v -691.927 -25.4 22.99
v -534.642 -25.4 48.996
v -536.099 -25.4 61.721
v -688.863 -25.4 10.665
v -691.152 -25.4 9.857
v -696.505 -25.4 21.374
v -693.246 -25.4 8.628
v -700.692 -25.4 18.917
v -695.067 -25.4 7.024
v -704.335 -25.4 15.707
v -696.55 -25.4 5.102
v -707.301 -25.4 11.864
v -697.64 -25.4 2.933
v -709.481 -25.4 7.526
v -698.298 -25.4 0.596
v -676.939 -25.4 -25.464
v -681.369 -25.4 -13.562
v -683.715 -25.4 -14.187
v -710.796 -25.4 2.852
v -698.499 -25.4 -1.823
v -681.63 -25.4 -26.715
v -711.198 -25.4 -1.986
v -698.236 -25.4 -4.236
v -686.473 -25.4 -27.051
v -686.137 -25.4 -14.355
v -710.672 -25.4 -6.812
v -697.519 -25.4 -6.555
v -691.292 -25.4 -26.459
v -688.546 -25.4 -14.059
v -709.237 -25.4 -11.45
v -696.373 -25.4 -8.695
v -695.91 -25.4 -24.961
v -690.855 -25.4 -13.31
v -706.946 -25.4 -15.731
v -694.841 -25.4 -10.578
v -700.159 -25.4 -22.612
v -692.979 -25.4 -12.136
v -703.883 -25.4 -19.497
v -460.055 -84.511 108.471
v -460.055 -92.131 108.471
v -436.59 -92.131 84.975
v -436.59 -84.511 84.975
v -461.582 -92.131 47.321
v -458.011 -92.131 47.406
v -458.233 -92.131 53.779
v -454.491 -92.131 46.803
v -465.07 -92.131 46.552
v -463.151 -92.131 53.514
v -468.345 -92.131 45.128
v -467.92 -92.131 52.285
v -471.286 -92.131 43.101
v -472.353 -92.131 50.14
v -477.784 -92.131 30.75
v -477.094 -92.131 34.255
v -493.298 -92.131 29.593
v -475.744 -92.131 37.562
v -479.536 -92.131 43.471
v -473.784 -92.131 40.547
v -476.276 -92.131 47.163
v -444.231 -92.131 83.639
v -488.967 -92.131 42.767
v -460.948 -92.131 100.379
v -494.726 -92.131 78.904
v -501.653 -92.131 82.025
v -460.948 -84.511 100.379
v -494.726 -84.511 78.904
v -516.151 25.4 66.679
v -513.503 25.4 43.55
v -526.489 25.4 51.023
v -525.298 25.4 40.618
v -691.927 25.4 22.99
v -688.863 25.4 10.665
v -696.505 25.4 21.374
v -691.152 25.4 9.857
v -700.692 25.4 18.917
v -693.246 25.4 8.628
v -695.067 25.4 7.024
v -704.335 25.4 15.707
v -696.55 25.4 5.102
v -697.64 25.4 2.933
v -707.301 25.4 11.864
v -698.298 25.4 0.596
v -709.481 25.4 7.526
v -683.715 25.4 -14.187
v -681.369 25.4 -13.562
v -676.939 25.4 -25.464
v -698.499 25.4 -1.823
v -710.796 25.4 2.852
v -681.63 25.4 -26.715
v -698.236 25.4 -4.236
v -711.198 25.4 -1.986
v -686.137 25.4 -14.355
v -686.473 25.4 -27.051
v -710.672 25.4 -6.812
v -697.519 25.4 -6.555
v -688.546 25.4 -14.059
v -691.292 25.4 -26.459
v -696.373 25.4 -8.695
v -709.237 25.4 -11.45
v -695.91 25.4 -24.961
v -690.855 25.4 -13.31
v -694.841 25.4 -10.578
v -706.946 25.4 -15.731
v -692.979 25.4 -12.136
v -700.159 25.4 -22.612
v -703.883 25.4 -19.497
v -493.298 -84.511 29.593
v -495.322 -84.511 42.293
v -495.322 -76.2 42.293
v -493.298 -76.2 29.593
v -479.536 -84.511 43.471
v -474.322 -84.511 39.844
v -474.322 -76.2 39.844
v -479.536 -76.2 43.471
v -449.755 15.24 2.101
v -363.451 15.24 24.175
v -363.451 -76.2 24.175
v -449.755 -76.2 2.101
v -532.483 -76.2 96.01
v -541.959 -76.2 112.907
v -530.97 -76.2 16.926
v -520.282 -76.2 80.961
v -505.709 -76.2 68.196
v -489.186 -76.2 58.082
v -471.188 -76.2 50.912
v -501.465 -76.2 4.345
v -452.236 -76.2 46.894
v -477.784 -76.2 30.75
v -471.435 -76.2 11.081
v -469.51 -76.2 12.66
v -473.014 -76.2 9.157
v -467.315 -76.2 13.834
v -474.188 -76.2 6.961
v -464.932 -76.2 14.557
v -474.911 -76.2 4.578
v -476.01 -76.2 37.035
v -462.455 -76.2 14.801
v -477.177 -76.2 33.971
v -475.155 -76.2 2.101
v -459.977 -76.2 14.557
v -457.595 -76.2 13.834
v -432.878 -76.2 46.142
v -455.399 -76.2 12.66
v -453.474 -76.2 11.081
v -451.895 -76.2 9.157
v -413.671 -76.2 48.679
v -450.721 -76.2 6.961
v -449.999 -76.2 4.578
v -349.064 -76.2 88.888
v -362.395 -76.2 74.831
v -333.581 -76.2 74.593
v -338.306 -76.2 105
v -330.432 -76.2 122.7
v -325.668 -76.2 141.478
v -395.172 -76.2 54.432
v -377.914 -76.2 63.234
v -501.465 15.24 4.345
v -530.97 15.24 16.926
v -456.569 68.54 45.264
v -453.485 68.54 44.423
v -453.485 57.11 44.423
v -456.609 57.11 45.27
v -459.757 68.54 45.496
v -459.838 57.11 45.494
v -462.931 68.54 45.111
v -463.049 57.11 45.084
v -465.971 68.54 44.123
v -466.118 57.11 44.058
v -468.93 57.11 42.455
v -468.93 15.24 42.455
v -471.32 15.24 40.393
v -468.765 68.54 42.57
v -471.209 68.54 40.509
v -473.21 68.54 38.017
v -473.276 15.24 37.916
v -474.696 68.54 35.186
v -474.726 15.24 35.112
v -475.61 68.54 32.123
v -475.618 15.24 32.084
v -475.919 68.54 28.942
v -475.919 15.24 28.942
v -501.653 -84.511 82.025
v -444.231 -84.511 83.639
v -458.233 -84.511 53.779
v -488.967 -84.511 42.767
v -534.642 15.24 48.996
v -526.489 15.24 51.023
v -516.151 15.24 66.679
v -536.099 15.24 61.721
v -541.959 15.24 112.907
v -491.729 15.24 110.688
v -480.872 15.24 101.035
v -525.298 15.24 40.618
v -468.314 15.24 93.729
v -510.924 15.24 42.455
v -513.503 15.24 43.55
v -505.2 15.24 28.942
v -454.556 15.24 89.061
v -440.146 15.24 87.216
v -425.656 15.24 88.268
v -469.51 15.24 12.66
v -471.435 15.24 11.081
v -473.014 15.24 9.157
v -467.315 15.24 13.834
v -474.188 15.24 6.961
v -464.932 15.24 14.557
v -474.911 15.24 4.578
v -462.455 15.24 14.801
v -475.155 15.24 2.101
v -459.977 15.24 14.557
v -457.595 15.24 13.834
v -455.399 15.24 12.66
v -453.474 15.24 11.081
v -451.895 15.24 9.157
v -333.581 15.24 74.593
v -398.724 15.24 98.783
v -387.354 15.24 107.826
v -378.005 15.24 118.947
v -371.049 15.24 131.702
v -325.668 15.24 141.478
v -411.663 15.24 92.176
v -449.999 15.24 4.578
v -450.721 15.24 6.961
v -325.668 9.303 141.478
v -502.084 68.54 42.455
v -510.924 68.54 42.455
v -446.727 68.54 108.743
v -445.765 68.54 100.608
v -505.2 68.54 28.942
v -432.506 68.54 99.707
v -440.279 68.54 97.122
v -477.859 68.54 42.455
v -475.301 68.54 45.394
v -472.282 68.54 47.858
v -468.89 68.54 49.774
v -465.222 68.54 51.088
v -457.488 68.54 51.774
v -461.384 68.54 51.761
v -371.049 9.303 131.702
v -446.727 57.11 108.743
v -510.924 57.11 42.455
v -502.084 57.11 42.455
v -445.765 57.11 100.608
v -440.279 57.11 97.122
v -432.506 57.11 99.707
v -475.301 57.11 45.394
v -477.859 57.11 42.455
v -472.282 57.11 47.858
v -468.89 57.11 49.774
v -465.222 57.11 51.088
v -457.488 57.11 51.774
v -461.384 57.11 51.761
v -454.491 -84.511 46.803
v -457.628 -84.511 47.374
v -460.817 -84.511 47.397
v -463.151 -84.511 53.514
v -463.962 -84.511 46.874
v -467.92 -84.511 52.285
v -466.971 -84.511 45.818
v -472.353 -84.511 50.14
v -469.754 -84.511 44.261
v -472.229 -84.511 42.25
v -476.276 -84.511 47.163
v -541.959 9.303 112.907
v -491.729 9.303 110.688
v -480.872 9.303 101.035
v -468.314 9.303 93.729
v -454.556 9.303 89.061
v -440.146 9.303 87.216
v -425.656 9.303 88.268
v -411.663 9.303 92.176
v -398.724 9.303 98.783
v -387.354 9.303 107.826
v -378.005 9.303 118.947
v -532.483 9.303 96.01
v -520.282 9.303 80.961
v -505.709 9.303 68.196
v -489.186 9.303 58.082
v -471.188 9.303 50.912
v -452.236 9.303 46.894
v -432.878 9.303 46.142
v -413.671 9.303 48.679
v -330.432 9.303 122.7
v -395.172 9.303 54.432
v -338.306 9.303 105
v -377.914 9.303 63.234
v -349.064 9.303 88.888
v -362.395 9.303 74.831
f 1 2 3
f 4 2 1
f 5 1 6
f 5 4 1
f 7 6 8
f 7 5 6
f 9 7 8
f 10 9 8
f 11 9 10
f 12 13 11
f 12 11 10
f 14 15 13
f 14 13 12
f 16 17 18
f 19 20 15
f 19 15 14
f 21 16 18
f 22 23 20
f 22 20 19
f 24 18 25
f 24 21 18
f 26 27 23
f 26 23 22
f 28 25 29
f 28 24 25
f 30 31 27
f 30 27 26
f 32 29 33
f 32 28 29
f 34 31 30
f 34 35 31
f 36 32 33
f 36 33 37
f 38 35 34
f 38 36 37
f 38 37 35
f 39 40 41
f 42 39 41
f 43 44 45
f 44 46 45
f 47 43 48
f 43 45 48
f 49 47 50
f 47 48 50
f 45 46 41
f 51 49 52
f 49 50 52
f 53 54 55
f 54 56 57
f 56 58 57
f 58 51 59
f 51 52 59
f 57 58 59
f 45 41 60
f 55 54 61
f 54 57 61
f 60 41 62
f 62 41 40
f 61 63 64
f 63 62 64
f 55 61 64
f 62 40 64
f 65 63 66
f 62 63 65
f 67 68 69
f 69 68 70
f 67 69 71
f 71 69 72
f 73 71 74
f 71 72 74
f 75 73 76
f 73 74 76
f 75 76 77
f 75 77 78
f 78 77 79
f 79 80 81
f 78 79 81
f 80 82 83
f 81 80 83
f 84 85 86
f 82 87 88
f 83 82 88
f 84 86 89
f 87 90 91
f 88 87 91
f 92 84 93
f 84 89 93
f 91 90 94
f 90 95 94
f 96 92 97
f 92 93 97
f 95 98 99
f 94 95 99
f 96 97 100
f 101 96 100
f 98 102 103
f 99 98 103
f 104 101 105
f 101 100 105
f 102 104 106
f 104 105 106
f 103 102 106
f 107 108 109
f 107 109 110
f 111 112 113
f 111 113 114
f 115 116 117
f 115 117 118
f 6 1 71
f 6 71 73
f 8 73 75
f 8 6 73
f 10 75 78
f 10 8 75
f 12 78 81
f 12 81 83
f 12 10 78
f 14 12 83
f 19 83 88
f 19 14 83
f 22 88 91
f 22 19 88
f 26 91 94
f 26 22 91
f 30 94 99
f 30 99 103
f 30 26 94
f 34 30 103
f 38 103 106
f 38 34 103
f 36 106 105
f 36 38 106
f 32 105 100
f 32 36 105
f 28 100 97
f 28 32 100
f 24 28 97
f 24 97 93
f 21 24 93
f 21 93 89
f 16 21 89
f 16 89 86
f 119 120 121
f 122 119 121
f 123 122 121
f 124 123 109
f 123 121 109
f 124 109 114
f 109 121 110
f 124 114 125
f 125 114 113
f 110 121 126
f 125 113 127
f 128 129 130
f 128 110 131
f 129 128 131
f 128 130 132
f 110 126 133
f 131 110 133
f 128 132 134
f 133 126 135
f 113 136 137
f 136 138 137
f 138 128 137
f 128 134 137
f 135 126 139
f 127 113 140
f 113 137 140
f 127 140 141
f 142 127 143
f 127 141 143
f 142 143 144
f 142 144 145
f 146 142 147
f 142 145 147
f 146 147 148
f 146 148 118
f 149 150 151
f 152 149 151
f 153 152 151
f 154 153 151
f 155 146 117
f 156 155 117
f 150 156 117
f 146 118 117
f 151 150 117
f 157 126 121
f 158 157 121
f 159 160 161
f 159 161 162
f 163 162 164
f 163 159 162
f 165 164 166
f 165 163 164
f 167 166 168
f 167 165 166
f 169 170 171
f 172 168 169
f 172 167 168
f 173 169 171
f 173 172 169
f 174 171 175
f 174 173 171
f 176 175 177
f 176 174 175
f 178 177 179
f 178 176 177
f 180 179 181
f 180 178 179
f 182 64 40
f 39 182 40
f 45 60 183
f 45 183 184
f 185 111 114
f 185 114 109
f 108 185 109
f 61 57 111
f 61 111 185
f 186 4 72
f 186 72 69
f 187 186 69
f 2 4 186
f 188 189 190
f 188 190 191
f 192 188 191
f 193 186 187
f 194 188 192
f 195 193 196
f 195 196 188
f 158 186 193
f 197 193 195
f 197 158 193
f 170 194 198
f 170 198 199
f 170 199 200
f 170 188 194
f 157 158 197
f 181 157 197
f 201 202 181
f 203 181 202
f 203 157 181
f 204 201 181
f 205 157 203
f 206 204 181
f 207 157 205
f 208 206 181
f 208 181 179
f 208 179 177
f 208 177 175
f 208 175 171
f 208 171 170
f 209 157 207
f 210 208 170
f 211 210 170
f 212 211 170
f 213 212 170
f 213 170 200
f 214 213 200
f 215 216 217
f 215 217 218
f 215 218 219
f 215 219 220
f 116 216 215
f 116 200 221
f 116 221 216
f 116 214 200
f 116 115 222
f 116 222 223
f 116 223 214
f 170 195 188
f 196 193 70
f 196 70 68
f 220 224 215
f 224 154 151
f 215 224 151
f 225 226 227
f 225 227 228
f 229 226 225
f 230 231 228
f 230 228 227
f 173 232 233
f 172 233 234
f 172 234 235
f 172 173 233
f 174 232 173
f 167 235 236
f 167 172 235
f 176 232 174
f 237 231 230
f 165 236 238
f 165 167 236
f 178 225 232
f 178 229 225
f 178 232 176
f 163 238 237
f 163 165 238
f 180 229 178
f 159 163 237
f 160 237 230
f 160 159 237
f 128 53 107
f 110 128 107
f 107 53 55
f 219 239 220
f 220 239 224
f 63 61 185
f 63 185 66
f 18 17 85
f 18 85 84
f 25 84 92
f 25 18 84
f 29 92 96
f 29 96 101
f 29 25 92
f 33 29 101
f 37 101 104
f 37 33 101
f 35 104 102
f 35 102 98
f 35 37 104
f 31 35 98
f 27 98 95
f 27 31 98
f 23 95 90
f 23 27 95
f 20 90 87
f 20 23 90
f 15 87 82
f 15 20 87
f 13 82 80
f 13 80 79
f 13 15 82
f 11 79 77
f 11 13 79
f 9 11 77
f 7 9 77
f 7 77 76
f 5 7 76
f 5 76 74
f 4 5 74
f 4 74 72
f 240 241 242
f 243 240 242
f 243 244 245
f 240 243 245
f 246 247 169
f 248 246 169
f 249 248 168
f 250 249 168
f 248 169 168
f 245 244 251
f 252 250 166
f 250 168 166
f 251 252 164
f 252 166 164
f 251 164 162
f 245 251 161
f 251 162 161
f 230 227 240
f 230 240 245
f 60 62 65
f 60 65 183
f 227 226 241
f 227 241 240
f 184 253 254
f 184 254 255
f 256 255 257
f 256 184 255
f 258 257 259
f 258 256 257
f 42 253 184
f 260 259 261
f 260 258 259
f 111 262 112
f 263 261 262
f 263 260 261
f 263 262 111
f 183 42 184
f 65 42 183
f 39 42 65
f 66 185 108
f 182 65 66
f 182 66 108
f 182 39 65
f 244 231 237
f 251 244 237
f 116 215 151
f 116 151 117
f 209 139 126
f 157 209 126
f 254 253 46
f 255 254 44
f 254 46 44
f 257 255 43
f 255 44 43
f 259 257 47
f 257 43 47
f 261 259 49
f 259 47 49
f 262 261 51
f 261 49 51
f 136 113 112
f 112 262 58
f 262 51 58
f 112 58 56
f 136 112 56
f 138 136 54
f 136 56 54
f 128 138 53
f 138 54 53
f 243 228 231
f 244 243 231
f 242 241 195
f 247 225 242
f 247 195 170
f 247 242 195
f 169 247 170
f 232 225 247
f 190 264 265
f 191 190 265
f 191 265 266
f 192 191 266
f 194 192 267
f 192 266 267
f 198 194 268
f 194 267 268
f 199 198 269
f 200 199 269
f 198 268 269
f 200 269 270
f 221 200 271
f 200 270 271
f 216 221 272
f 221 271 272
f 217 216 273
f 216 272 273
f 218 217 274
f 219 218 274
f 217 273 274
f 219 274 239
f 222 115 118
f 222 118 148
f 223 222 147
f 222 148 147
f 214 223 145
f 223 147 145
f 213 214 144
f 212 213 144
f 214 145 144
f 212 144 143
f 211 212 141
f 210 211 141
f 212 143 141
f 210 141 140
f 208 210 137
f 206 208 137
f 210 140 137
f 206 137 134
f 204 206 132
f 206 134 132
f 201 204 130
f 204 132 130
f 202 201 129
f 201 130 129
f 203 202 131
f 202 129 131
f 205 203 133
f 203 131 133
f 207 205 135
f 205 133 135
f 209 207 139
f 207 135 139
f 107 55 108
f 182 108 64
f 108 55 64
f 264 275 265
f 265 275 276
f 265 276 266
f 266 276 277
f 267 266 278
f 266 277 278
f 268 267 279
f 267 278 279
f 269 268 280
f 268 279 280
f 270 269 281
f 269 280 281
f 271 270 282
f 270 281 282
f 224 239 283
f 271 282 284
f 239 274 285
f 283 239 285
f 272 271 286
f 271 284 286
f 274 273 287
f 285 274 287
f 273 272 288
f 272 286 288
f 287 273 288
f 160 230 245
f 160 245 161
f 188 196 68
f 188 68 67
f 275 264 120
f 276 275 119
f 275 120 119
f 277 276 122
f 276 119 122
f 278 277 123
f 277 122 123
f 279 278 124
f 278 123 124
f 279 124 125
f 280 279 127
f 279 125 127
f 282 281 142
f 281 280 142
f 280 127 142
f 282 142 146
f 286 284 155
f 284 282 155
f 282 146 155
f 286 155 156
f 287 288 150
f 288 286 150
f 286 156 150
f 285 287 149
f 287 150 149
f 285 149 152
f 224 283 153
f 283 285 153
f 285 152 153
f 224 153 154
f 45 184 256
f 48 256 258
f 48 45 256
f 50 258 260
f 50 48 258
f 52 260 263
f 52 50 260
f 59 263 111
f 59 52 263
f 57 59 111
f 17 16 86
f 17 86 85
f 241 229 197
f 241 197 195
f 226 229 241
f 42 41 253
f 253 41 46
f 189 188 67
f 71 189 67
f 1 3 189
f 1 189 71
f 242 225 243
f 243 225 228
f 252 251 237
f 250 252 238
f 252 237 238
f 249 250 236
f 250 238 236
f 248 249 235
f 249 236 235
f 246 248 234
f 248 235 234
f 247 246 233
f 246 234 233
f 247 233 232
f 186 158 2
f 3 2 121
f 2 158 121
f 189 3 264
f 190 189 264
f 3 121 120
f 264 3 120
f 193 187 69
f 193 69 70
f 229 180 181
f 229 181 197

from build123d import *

# Parameters (mm, degrees)
BOSS_EXTRUDE1_DEPTH       = 15.24
BOSS_EXTRUDE1_DEPTH_BACK  = 76.2
BOSS_EXTRUDE2_DEPTH       = 11.43
SHELL3_T                  = -6.35
BOSS_EXTRUDE9_REACH       = 580.52
BOSS_EXTRUDE4_DEPTH       = 7.62
SHELL4_T                  = -6.35
BOSS_EXTRUDE10_START      = -5.936799282
BOSS_EXTRUDE10_DEPTH      = 5.936799282
BOSS_EXTRUDE11_DEPTH      = 25.4
BOSS_EXTRUDE11_DEPTH_BACK = 25.4
BOSS_EXTRUDE12_REACH      = 744.722


with BuildPart() as part:
    # Sketch3 → Boss-Extrude1 (new, two sides: drawn at the far end of the back side and taken through both)
    with BuildSketch(Plane(origin=(0, 0, 0), x_dir=(1, 0, 0), z_dir=(0, 1, 0)).offset(-BOSS_EXTRUDE1_DEPTH_BACK)):
        with BuildLine():
            Line((-475.154754325, -2.10083146), (-501.46472086, -4.34467525))
            Line((-501.46472086, -4.34467525), (-530.970406525, -16.925757689))
            Line((-530.970406525, -16.925757689), (-541.959235577, -112.906916108))
            ThreePointArc((-541.959235577, -112.906916108), (-423.220596764, -47.00180275), (-325.667958287, -141.478419116))
            Line((-325.667958287, -141.478419116), (-333.580935141, -74.592900266))
            Line((-333.580935141, -74.592900266), (-363.451088866, -24.174556876))
            Line((-363.451088866, -24.174556876), (-449.754754325, -2.10083146))
            ThreePointArc((-449.754754325, -2.10083146), (-462.454754325, -14.800833325), (-475.154754325, -2.10083146))
        make_face()
    extrude(amount=BOSS_EXTRUDE1_DEPTH + BOSS_EXTRUDE1_DEPTH_BACK)

    # Boss-Extrude9: up to this face of the body (flat: up to its plane)
    boss_extrude9_end = Plane(part.part.faces().sort_by_distance((-443.624527124, 15.24, 42.595574003))[0])
    # Sketch11 → Boss-Extrude9 (add, up to the picked face)
    with BuildSketch(Plane(origin=(0, 68.54, 0), x_dir=(1, 0, 0), z_dir=(0, 1, 0)), mode=Mode.PRIVATE) as boss_extrude9_sk1:
        with BuildLine():
            Line((-505.199519379, -28.941561379), (-510.924193781, -42.454904444))
            Line((-510.924193781, -42.454904444), (-468.930038741, -42.454904444))
            ThreePointArc((-468.930038741, -42.454904444), (-474.068166901, -36.548395666), (-475.918740123, -28.941649602))
            Line((-475.918740123, -28.941649602), (-505.199519379, -28.941561379))
        make_face()
    boss_extrude9_tool1 = split(extrude(boss_extrude9_sk1.sketch, amount=-BOSS_EXTRUDE9_REACH, mode=Mode.PRIVATE), bisect_by=boss_extrude9_end, keep=Keep.BOTH, mode=Mode.PRIVATE)


with BuildPart() as body_2:
    # Sketch4 → Boss-Extrude2 (new body)
    with BuildSketch(Plane(origin=(0, 68.54, 0), x_dir=(1, 0, 0), z_dir=(0, 1, 0))):
        with BuildLine():
            Line((-505.199519379, -28.941561379), (-510.924193781, -42.454904444))
            Line((-510.924193781, -42.454904444), (-446.727083924, -108.742597242))
            Line((-446.727083924, -108.742597242), (-432.506297568, -99.706904201))
            Line((-432.506297568, -99.706904201), (-453.485090126, -44.423263798))
            ThreePointArc((-453.485090126, -44.423263798), (-468.76509838, -42.570216845), (-475.918740123, -28.941649602))
            Line((-475.918740123, -28.941649602), (-505.199519379, -28.941561379))
        make_face()
    extrude(amount=-BOSS_EXTRUDE2_DEPTH)

    # Shell3
    shell3_openings = [body_2.faces().sort_by_distance(p)[0] for p in [
        (-469.398872601, 57.11, 63.557756805),
        (-469.398872601, 68.54, 63.557756805),
    ]]
    offset(amount=SHELL3_T, openings=shell3_openings, kind=Kind.INTERSECTION)


with BuildPart() as part_1:
    add(part.part)

    add(body_2.part)  # Boss-Extrude9 merges body 2
    add(boss_extrude9_tool1.solids().sort_by(Axis((-490.927934, 68.54, 36.102447), (0, -1, 0)))[0])

    # Sketch8 → Boss-Extrude10 (add)
    with BuildSketch(Plane(origin=(0, 15.24, 0), x_dir=(1, 0, 0), z_dir=(0, 1, 0)).offset(BOSS_EXTRUDE10_START)):
        with BuildLine():
            Line((-371.049471839, -131.701729119), (-325.667958287, -141.478419116))
            ThreePointArc((-325.667958287, -141.478419116), (-423.220596764, -47.00180275), (-541.959235577, -112.906916108))
            Line((-541.959235577, -112.906916108), (-491.729175354, -110.68768413))
            ThreePointArc((-491.729175354, -110.68768413), (-425.655830818, -88.268337191), (-371.049471839, -131.701729119))
        make_face()
    extrude(amount=BOSS_EXTRUDE10_DEPTH)

    # Sketch9 → Boss-Extrude11 (add, two sides: drawn at the far end of the back side and taken through both)
    with BuildSketch(Plane(origin=(0, 0, 0), x_dir=(1, 0, 0), z_dir=(0, 1, 0)).offset(-BOSS_EXTRUDE11_DEPTH_BACK)):
        with BuildLine():
            Line((-676.938792406, 25.463963625), (-681.369396203, 13.561873472))
            ThreePointArc((-681.369396203, 13.561873472), (-697.932826151, 5.412719448), (-688.863344118, -10.665228762))
            Line((-688.863344118, -10.665228762), (-526.489446237, -51.02276527))
            Line((-526.489446237, -51.02276527), (-525.298257919, -40.618414259))
            Line((-525.298257919, -40.618414259), (-513.502810151, -43.550136784))
            Line((-513.502810151, -43.550136784), (-516.15079803, -66.678801621))
            Line((-516.15079803, -66.678801621), (-691.926688237, -22.990240843))
            ThreePointArc((-691.926688237, -22.990240843), (-710.065652303, 9.165655576), (-676.938792406, 25.463963625))
        make_face()
    extrude(amount=BOSS_EXTRUDE11_DEPTH + BOSS_EXTRUDE11_DEPTH_BACK)

    # Boss-Extrude12: up to this face of the body (flat: up to its plane)
    boss_extrude12_end = Plane(part_1.part.faces().sort_by_distance((-443.624527124, -76.2, 42.595574003))[0])
    # Sketch12 → Boss-Extrude12 (add, up to the picked face)
    with BuildSketch(Plane.XZ.offset(92.130800062), mode=Mode.PRIVATE) as boss_extrude12_sk1:
        with BuildLine():
            Line((-493.29786016, 29.59254273), (-477.784324755, 30.750375257))
            ThreePointArc((-477.784324755, 30.750375257), (-476.661333768, 35.528904506), (-474.321994889, 39.844335441))
            Line((-474.321994889, 39.844335441), (-479.53607938, 43.470681078))
            Line((-479.53607938, 43.470681078), (-495.321687866, 42.29254273))
            Line((-495.321687866, 42.29254273), (-493.29786016, 29.59254273))
        make_face()
    boss_extrude12_tool1 = split(extrude(boss_extrude12_sk1.sketch, amount=-BOSS_EXTRUDE12_REACH, mode=Mode.PRIVATE), bisect_by=boss_extrude12_end, keep=Keep.BOTH, mode=Mode.PRIVATE)


with BuildPart() as body_2_2:
    # Sketch6 → Boss-Extrude4 (new body)
    with BuildSketch(Plane.XZ.offset(92.130800062)):
        with BuildLine():
            Line((-493.29786016, 29.59254273), (-501.65329384, 82.024875489))
            Line((-501.65329384, 82.024875489), (-460.055244029, 108.470724329))
            Line((-460.055244029, 108.470724329), (-436.590495923, 84.974770196))
            Line((-436.590495923, 84.974770196), (-454.490501674, 46.803141976))
            ThreePointArc((-454.490501674, 46.803141976), (-469.864919046, 44.185661822), (-477.784324755, 30.750375257))
            Line((-477.784324755, 30.750375257), (-493.29786016, 29.59254273))
        make_face()
    extrude(amount=-BOSS_EXTRUDE4_DEPTH)

    # Shell4
    shell4_openings = [body_2_2.faces().sort_by_distance(p)[0] for p in [
        (-471.64936301, -84.510800062, 70.060968027),
        (-471.64936301, -92.130800062, 70.060968027),
    ]]
    offset(amount=SHELL4_T, openings=shell4_openings, kind=Kind.INTERSECTION)


with BuildPart() as part_2:
    add(part_1.part)

    add(body_2_2.part)  # Boss-Extrude12 merges body 2 2
    add(boss_extrude12_tool1.solids().sort_by(Axis((-485.45228, -92.1308, 36.761722), (0, 1, 0)))[0])


solid = part_2.part
